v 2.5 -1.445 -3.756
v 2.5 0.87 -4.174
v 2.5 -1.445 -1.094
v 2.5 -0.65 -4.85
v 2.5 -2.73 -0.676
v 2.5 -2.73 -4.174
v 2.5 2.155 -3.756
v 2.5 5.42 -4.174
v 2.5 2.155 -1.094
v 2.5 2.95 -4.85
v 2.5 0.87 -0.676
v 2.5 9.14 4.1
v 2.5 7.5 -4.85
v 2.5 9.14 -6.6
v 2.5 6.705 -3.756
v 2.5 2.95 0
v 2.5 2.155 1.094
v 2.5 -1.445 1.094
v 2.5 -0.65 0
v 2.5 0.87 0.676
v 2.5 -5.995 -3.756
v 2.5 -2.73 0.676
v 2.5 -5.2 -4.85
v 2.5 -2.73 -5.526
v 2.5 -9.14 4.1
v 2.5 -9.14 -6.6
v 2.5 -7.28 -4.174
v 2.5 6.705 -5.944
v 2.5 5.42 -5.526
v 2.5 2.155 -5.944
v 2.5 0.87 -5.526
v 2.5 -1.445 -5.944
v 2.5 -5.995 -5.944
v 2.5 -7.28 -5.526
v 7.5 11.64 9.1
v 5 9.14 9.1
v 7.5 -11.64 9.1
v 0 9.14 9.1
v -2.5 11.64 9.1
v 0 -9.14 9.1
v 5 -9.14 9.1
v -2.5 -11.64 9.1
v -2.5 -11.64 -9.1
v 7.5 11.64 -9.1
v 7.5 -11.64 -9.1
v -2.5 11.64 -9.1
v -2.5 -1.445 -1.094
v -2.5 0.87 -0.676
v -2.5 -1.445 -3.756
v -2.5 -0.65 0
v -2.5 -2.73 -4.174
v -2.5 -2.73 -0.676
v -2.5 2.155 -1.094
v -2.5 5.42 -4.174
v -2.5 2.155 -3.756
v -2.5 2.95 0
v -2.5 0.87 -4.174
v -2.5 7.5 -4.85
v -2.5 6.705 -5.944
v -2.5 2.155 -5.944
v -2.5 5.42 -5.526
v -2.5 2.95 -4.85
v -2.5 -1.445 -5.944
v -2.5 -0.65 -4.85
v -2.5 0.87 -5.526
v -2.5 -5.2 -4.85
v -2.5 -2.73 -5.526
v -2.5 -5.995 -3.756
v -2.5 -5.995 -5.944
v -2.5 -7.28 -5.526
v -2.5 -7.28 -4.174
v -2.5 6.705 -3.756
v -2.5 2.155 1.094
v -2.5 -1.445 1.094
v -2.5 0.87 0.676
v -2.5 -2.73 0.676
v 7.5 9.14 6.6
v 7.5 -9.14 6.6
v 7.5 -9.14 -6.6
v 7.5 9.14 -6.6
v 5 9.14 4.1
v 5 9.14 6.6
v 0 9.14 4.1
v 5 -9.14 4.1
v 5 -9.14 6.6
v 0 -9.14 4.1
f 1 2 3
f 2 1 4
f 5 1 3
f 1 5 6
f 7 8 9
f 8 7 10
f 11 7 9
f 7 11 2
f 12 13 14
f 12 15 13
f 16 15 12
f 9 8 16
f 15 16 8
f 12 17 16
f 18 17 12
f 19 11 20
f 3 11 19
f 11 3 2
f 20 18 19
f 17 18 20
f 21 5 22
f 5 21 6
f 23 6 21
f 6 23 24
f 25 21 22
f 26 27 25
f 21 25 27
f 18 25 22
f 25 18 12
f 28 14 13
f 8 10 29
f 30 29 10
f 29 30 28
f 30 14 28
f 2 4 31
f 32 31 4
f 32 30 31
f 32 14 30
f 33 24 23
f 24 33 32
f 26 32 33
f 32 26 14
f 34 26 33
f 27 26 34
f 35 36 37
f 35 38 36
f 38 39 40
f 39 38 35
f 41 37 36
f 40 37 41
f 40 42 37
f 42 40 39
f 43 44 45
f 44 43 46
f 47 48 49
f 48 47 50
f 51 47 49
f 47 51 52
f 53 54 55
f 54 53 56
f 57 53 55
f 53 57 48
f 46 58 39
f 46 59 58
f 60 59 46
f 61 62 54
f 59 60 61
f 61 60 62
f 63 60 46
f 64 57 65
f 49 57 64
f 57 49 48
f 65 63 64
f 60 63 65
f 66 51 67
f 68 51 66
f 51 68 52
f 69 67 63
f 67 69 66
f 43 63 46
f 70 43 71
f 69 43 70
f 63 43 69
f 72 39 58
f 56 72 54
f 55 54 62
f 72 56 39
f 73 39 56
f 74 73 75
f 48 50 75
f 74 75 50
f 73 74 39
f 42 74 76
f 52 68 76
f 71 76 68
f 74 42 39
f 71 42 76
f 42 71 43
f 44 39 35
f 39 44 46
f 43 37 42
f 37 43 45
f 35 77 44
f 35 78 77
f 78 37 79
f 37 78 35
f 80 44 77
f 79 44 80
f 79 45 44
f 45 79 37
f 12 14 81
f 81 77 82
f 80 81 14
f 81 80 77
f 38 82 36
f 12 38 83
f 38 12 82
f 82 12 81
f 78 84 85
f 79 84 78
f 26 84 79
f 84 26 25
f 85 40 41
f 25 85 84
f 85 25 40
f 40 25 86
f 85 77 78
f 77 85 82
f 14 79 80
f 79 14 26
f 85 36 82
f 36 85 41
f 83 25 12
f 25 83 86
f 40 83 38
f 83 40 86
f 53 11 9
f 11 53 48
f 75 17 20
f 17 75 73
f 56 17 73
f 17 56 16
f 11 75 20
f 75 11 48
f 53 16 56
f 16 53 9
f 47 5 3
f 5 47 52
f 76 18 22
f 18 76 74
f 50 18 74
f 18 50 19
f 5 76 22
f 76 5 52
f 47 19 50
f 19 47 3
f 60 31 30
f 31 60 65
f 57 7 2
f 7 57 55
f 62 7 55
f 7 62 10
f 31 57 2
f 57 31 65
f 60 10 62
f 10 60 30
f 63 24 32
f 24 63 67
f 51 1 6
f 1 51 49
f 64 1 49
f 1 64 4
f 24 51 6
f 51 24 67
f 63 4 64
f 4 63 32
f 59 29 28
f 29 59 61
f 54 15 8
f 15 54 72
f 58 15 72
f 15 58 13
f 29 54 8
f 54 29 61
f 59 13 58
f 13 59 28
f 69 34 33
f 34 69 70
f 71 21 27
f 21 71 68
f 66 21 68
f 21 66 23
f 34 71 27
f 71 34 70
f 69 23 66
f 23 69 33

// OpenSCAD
length = 17.78;
height = 12.7;
holeGap = 12.7;
borderT = 2.5;
buff = 0.25;
difference()
{
    union()
    {
        cube([5, length + 2*borderT + 2*buff, height + 2*borderT + 2*buff], center = true);
        translate([5,(2*buff + length + borderT)/2,0])
        {
            cube([5, borderT, height + 2*borderT + 2*buff], center = true);
        }
        translate([5,-(2*buff + length + borderT)/2,0])
        {
            cube([5, borderT, height + 2*borderT + 2*buff], center = true);
        }
        translate([5,0,(2*buff + height + borderT)/2])
        {
            cube([5, length + 2*borderT + 2*buff, borderT], center = true);
        }
        translate([5,0,-(2*buff + height + borderT)/2])
        {
            cube([5, length + 2*borderT + 2*buff, borderT], center = true);
        }
    }
    translate([2.5,0,(2*buff + height + borderT)/2])
        {
            cube([5, length + 2*buff, borderT + 5], center = true);
        }
    translate([0, 1.8, 0])
    {
        rotate([90,0,90])
        {   
            cylinder(d = 2.3,h = 10, center = true);
        }
    }
    translate([0, -1.8, 0])
    {
        rotate([90,0,90])
        {   
            cylinder(d = 2.3,h = 10, center = true);
        }
    }
    translate([0, 1.8, -height/2 + 1.5])
    {
        rotate([90,0,90])
        {   
            cylinder(d = 2.3,h = 10, center = true);
        }
    }
    translate([0, -1.8, -height/2 + 1.5])
    {
        rotate([90,0,90])
        {   
            cylinder(d = 2.3,h = 10, center = true);
        }
    }
    translate([0, holeGap/2, -height/2 + 1.5])
    {
        rotate([90,0,90])
        {   
            cylinder(d = 2.3,h = 10, center = true);
        }
    }
    translate([0,-holeGap/2 , -height/2 + 1.5])
    {
        rotate([90,0,90])
        {   
            cylinder(d = 2.3,h = 10, center = true);
        }
    }
}
